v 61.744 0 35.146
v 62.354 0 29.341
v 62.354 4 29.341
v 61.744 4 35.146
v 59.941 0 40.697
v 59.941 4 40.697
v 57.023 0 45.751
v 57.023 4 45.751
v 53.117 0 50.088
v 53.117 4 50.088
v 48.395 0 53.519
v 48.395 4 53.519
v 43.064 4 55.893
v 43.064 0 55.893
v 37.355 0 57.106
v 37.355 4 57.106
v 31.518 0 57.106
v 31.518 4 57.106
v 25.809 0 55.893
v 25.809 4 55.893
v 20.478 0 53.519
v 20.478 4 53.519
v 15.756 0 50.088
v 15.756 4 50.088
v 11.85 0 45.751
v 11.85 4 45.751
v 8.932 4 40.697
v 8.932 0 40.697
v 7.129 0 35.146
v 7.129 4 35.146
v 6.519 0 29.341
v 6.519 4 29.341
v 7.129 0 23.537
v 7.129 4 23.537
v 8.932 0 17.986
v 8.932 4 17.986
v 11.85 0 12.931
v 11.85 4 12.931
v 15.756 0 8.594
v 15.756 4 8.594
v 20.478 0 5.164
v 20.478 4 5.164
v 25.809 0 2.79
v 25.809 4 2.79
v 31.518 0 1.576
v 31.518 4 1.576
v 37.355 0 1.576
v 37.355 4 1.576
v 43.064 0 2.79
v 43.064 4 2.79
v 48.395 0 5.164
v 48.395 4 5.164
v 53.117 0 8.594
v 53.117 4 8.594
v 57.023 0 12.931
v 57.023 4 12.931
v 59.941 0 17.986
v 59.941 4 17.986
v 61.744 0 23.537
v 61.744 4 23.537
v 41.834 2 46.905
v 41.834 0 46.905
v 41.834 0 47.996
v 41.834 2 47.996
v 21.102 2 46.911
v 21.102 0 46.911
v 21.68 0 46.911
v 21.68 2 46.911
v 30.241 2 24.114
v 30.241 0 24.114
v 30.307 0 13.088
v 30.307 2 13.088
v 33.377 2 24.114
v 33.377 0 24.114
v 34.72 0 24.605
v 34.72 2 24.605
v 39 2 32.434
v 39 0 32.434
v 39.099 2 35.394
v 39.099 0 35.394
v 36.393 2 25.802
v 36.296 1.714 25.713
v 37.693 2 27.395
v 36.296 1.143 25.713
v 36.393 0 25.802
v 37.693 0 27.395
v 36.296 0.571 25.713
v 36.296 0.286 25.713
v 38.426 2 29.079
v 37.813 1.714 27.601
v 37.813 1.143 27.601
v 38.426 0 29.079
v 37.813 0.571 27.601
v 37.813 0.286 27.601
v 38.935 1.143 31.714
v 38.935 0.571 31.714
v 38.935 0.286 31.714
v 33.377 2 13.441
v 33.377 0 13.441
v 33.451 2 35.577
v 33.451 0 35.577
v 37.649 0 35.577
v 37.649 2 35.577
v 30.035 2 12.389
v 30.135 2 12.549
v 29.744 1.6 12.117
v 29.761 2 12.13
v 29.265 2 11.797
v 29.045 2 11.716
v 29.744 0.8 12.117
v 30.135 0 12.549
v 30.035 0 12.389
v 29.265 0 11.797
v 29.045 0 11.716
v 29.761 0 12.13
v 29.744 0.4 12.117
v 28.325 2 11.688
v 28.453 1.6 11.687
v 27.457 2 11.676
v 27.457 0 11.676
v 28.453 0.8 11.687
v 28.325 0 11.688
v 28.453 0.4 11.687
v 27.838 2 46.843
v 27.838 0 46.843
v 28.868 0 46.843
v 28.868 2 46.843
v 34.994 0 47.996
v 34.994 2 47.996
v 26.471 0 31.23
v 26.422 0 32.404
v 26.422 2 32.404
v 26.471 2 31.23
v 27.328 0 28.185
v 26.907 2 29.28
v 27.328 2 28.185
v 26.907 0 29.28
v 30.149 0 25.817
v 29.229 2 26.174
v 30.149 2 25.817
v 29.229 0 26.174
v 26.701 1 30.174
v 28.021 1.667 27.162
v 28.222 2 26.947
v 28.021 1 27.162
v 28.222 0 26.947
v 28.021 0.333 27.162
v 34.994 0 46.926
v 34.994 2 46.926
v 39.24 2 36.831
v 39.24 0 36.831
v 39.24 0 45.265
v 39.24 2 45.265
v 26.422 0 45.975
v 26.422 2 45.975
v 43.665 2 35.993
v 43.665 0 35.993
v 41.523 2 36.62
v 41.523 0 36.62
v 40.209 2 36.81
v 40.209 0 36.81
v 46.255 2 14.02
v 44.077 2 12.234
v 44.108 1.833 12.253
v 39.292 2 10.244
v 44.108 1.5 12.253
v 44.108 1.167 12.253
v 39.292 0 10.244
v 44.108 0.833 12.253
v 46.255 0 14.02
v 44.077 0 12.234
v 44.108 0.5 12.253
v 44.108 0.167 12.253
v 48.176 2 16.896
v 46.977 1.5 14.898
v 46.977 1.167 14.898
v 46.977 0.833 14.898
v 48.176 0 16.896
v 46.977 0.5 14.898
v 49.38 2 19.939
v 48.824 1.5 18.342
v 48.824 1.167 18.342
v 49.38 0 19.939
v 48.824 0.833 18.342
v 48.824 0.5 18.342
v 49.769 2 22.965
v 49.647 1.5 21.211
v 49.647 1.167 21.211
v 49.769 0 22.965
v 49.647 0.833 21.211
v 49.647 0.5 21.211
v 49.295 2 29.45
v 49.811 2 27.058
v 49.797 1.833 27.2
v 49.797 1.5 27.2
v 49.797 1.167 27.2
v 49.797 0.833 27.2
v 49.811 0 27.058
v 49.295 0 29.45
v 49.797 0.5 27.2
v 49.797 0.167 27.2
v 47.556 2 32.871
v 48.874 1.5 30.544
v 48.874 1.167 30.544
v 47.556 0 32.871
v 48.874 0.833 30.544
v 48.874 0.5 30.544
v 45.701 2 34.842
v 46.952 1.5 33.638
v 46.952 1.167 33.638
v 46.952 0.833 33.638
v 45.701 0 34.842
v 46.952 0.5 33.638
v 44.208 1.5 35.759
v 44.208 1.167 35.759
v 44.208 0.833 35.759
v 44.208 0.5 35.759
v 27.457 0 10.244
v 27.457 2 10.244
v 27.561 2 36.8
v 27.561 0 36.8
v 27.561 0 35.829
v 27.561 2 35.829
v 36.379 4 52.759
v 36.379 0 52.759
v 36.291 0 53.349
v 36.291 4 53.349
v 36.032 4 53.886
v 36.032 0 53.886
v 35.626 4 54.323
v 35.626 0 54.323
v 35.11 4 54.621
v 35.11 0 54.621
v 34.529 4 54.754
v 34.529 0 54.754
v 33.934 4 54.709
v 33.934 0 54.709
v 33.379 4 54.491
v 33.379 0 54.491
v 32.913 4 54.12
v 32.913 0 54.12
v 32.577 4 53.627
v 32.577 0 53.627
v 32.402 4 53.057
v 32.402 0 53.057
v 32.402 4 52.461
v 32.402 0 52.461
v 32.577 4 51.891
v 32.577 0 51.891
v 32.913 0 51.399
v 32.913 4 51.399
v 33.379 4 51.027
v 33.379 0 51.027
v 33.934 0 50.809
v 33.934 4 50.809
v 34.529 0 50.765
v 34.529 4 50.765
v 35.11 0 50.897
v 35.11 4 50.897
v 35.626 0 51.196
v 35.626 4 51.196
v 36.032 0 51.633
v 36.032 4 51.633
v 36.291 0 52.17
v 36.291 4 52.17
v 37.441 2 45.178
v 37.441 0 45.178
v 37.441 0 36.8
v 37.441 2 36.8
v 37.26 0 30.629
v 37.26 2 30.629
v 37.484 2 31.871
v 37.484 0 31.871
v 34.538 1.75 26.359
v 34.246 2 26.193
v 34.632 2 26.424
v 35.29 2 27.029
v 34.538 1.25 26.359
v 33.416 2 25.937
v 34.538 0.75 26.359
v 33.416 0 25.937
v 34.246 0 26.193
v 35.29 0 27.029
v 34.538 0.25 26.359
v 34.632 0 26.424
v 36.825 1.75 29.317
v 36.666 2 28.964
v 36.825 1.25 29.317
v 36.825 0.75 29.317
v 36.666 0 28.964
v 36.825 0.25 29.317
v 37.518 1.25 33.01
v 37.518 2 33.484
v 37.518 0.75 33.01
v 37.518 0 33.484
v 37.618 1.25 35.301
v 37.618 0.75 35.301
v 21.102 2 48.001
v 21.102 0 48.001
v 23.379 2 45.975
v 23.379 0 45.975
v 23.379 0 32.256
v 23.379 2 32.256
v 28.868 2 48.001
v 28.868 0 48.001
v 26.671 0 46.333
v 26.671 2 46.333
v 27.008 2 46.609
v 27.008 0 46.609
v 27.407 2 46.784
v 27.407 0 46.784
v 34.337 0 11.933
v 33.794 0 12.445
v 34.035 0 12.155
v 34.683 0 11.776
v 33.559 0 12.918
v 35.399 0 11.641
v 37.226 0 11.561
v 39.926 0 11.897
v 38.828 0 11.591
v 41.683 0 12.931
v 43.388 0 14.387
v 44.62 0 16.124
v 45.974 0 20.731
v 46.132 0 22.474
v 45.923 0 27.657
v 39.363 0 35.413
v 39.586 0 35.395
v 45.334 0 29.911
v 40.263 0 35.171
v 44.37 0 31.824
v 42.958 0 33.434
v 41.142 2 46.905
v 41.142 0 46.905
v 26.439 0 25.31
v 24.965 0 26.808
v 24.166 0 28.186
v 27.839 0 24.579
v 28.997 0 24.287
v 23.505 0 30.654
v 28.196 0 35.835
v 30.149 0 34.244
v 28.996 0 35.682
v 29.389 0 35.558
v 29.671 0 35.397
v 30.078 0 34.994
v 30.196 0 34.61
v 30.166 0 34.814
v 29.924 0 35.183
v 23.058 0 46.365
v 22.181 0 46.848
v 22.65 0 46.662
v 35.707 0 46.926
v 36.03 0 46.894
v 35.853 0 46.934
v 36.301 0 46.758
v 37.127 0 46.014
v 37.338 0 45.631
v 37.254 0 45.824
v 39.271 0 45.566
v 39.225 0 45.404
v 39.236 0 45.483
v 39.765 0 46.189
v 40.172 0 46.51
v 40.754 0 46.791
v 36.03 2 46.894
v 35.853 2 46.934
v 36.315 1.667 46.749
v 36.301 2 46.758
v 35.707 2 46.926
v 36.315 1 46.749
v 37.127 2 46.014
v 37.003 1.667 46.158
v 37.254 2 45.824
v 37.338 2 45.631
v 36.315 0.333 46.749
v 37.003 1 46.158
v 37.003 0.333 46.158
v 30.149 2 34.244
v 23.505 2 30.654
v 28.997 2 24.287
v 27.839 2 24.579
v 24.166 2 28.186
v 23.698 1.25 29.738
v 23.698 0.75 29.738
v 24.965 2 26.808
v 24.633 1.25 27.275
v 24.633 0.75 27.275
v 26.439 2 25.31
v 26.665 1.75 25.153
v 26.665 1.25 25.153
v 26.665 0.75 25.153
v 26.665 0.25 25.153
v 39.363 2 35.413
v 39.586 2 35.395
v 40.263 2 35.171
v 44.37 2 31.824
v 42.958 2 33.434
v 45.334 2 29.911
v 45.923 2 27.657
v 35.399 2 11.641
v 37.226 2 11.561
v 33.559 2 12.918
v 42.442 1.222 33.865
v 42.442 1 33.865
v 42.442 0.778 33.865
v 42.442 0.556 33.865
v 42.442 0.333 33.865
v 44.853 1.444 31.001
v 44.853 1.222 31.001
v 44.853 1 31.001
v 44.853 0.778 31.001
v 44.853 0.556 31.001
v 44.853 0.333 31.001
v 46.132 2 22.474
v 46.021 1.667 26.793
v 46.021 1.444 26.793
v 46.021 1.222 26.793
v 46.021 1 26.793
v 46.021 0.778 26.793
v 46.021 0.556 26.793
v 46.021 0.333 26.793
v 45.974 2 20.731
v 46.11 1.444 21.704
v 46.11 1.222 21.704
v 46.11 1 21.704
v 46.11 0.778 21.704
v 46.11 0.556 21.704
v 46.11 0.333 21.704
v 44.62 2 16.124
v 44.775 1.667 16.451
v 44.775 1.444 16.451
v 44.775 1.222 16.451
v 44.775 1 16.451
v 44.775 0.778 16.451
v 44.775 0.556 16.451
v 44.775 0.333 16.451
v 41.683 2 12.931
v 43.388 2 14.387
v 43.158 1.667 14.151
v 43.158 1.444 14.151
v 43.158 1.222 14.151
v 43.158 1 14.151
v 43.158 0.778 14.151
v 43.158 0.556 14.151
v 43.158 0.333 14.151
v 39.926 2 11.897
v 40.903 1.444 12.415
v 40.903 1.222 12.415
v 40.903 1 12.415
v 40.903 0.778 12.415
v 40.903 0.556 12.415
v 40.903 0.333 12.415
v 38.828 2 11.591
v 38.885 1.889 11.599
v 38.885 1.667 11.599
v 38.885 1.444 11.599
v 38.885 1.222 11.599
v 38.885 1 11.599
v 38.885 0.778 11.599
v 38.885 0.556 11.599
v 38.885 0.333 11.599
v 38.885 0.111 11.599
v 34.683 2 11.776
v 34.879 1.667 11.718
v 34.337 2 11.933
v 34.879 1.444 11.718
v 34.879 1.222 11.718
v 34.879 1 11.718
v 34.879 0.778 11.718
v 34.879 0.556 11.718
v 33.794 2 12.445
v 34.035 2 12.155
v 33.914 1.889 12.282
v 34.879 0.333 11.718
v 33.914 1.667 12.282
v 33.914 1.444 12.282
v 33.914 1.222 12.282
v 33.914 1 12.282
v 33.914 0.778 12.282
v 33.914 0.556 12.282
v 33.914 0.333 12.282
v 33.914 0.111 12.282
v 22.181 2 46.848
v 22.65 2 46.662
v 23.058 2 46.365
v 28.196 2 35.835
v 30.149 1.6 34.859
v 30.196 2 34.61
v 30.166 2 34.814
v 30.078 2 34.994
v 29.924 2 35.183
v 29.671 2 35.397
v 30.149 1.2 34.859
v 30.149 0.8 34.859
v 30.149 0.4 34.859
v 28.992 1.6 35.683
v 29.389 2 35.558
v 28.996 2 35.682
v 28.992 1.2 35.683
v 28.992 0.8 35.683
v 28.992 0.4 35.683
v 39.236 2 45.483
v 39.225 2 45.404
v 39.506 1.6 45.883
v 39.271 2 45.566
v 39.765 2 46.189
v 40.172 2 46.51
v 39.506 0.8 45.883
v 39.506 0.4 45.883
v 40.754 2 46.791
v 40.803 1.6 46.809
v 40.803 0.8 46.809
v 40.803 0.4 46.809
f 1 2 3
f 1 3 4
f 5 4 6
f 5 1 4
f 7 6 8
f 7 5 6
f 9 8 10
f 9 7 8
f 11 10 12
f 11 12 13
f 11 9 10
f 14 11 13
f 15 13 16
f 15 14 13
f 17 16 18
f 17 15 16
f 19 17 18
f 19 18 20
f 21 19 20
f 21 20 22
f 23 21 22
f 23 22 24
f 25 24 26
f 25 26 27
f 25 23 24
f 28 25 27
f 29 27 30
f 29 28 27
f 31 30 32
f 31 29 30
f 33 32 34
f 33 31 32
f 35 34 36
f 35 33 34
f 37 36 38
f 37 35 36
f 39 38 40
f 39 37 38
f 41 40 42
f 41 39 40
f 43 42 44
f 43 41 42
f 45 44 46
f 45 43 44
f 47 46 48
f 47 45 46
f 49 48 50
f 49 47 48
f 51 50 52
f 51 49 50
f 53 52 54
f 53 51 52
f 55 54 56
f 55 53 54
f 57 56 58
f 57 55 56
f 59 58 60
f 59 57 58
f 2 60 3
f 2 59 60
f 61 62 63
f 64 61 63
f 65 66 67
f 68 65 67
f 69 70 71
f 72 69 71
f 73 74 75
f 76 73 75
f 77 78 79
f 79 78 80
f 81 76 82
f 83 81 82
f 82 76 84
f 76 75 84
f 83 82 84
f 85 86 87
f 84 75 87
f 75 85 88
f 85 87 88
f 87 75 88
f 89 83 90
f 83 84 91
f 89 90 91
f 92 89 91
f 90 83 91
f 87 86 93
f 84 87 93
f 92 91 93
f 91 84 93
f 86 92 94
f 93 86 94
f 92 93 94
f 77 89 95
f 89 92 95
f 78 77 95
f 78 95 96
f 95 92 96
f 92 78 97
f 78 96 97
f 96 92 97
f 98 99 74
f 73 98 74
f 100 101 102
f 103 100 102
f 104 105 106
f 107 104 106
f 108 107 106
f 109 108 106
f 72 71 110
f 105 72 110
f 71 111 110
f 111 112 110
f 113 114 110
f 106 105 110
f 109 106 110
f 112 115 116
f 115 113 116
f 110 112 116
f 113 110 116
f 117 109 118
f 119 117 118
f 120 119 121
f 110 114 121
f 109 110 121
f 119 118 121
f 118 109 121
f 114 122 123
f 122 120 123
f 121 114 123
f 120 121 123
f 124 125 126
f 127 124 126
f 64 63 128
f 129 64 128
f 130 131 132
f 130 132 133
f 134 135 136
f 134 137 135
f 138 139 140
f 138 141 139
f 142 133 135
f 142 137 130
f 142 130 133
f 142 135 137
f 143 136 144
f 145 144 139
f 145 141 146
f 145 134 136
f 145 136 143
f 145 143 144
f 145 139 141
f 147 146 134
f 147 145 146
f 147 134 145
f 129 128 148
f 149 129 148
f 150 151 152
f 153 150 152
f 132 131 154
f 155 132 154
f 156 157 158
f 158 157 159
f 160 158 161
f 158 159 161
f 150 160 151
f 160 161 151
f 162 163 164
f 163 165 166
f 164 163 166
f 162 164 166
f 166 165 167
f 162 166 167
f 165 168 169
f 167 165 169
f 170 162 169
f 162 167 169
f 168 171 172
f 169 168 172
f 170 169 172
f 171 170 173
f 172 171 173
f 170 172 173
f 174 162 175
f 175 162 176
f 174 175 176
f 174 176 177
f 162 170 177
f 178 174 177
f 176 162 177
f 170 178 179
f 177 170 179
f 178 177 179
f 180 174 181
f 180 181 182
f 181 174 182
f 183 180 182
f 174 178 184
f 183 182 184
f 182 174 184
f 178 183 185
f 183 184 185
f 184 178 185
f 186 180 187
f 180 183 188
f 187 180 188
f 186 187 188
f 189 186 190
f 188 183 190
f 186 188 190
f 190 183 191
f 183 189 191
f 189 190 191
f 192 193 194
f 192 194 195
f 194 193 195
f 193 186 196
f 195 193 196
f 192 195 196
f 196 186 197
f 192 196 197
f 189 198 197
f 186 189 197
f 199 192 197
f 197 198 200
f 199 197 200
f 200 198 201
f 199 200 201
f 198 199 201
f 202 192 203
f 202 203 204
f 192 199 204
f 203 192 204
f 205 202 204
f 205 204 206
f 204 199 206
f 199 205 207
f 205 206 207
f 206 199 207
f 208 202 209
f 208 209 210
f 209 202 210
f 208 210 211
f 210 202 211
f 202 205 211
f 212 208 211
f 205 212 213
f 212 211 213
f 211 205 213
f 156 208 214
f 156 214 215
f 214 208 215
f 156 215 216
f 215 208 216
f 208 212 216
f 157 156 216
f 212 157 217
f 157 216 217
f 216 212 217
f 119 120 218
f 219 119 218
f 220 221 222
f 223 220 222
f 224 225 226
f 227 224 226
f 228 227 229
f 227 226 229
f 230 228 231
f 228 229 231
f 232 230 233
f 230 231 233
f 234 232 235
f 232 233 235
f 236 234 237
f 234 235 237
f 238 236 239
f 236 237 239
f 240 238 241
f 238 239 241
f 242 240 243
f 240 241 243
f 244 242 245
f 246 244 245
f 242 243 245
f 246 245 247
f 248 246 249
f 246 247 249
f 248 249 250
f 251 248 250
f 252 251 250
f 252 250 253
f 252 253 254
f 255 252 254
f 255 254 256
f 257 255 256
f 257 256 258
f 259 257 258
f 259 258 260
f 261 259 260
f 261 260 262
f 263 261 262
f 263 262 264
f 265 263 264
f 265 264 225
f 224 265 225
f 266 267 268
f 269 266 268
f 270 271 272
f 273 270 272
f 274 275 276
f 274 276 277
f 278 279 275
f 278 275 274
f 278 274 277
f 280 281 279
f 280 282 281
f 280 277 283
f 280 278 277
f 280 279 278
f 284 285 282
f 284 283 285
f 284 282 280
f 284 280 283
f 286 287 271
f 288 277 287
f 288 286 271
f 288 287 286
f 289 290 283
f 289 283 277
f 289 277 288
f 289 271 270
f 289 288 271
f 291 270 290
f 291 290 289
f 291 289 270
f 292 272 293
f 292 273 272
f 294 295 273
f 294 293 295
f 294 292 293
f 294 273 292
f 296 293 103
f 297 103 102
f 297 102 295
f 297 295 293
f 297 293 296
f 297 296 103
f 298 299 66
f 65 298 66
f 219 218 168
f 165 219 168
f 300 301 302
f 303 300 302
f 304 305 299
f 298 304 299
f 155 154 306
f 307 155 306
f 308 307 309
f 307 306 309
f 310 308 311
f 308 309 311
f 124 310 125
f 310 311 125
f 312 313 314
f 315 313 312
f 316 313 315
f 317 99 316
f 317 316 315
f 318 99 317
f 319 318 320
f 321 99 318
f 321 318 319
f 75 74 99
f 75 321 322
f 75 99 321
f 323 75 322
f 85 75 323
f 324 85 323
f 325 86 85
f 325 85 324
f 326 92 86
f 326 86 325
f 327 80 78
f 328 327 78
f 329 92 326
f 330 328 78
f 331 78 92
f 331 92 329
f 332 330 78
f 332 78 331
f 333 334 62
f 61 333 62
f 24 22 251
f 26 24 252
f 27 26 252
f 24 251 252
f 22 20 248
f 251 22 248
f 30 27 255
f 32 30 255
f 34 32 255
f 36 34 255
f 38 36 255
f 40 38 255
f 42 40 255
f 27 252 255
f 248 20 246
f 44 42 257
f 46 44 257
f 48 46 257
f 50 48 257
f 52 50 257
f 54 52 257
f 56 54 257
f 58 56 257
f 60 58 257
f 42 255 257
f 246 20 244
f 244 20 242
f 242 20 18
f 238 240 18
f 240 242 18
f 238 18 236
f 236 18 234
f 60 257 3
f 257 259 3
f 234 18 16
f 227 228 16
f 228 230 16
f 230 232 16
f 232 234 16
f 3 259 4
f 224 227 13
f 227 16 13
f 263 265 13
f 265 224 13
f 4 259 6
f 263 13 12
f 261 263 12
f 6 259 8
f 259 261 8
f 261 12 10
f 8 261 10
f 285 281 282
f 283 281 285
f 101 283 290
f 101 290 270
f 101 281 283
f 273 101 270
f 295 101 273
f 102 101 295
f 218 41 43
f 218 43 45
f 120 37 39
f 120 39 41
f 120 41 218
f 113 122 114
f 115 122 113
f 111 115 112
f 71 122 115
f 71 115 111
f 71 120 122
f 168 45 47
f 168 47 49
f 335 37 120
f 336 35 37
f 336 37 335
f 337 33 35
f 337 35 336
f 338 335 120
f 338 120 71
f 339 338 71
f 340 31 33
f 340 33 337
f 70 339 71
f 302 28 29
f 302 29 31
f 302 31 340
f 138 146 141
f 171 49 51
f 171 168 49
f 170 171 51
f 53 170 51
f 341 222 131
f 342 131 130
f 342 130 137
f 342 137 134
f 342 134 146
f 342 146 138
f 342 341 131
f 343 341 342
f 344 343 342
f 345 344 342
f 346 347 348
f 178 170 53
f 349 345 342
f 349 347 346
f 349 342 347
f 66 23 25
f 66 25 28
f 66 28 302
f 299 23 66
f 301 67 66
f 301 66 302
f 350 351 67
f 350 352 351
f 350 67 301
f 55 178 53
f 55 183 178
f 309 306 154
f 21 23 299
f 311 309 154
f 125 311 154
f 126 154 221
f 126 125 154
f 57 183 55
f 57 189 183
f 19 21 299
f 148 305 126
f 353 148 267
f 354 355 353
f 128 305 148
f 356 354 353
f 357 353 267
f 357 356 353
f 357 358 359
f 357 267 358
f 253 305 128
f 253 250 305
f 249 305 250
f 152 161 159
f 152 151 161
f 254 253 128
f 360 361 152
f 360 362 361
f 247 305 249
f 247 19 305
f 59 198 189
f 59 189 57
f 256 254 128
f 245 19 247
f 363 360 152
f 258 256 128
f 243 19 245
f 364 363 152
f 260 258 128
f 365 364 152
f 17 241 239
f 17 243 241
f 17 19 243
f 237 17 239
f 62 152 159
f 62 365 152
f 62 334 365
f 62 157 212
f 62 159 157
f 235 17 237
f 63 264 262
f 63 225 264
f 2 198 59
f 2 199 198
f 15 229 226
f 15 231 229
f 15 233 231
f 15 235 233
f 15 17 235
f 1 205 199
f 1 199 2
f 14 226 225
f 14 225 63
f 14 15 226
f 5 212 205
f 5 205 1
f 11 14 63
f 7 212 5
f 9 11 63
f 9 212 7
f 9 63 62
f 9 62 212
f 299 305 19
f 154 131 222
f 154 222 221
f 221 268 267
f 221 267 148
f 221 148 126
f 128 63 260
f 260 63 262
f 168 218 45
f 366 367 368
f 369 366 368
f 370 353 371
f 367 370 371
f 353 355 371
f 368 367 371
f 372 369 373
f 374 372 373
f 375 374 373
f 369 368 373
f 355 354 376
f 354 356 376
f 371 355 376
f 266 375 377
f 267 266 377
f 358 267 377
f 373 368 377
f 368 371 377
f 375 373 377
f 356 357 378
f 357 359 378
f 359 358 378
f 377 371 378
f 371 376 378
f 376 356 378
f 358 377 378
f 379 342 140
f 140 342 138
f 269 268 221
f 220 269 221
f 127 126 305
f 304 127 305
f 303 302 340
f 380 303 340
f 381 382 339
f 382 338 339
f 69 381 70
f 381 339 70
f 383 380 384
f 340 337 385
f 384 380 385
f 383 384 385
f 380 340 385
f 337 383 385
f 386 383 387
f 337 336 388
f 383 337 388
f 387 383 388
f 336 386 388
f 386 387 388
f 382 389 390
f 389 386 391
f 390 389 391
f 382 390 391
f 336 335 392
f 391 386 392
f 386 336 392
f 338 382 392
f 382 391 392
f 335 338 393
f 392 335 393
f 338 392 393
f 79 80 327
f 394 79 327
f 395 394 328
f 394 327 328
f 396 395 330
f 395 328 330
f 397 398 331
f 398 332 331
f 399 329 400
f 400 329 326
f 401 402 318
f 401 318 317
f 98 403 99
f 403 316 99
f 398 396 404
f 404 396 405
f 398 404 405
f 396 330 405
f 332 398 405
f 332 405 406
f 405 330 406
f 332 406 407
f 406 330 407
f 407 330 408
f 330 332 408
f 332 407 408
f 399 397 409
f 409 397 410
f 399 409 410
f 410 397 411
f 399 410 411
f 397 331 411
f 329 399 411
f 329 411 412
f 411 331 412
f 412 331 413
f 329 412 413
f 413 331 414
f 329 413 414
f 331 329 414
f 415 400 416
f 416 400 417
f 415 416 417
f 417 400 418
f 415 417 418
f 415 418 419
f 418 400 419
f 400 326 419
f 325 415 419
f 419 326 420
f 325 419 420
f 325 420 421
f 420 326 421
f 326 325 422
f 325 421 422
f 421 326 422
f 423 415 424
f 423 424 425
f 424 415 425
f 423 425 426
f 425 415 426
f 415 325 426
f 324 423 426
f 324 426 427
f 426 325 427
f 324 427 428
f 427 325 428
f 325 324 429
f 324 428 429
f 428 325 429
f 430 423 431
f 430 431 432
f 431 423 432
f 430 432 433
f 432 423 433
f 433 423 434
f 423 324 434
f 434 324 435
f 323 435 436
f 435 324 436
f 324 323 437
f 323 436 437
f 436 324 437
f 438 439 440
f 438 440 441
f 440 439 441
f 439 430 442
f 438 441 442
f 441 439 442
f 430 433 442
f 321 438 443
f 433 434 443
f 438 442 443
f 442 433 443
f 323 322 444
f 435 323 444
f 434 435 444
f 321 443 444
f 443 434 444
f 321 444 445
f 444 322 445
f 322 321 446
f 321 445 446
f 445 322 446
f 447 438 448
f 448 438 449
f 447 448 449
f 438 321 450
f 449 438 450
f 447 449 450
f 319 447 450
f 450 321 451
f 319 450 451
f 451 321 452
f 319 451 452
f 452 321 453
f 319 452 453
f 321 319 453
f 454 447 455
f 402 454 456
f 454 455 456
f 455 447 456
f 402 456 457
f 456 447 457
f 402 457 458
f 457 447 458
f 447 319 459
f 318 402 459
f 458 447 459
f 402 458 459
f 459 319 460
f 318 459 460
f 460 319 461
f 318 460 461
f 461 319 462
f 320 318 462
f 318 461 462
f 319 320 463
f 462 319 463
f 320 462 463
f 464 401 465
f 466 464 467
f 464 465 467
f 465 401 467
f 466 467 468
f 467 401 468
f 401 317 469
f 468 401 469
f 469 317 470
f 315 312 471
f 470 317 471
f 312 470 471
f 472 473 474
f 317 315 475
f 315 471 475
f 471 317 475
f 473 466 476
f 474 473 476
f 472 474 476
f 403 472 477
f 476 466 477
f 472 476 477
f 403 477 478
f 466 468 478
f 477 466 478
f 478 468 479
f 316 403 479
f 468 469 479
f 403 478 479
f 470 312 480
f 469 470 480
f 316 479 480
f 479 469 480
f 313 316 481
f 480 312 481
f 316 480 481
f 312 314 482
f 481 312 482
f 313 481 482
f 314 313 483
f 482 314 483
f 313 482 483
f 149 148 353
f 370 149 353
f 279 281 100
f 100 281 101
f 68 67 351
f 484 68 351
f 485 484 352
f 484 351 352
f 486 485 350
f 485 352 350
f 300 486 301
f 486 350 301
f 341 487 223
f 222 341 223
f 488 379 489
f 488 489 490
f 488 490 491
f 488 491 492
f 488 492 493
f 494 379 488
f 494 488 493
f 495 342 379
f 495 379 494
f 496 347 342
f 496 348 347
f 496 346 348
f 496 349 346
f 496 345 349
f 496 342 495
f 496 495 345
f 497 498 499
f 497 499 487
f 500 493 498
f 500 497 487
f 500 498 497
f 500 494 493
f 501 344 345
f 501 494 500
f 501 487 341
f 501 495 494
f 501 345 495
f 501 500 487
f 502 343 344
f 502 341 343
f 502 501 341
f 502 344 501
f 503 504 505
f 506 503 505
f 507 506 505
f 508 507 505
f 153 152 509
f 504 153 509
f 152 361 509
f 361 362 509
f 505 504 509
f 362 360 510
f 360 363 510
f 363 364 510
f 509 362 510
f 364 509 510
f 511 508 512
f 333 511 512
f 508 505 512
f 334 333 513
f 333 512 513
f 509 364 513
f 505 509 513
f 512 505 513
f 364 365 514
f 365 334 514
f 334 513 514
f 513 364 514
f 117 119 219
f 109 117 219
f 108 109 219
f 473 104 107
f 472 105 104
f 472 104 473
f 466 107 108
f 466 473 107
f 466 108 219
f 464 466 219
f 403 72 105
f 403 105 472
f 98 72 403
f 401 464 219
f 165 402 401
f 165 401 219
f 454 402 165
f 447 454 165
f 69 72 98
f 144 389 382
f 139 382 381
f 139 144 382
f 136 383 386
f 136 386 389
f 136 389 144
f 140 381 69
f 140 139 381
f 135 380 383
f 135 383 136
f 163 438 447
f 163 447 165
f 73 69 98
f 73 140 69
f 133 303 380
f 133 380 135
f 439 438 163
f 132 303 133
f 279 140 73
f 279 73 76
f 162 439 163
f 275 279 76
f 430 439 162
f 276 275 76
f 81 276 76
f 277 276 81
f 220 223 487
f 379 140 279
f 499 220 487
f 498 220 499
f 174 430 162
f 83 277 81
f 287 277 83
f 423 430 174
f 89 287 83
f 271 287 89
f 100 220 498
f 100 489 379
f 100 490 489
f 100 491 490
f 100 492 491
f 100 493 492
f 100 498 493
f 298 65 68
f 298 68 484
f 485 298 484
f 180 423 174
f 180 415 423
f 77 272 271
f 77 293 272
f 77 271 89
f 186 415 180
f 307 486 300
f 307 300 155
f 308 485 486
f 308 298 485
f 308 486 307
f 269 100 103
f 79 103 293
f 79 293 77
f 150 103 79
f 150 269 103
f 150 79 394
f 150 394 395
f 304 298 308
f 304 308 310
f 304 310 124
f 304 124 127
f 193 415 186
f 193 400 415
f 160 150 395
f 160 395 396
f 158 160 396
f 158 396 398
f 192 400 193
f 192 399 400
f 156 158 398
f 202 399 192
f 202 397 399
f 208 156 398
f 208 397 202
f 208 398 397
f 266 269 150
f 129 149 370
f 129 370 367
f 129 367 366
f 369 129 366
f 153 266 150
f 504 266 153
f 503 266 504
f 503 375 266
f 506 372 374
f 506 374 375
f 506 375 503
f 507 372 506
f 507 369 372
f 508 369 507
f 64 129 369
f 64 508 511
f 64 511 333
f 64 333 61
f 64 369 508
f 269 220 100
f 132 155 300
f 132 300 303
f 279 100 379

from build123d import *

# Parameters (mm, degrees)
F1_R     = 27.9179643297
F2_DEPTH = 4
F3_DEPTH = 2
F4_R     = 2
F5_DEPTH = 25


with BuildPart() as f2:
    # F1 (on Front) → F2 (new body)
    with BuildSketch(Plane.XZ):
        with Locations((34.4365164638, 29.3412599713)):
            Circle(F1_R)
    extrude(amount=-F2_DEPTH)

    # F0 (on Front) → F3 (cut)
    with BuildSketch(Plane.XZ):
        with BuildLine():
            Line((28.8679711521, 48.000831157), (21.2418399751, 48.000831157))
            Line((21.2418399751, 48.000831157), (21.1016796529, 48.000831157))
            Line((21.1016796529, 48.000831157), (21.1016796529, 46.9109527767))
            Line((21.1016796529, 46.9109527767), (21.6799061745, 46.9109527767))
            ThreePointArc((21.6799061745, 46.9109527767), (22.6499247341, 46.6616237032), (23.3794841915, 45.9754429758))
            Line((23.3794841915, 45.9754429758), (23.3794841915, 32.2561040521))
            add(Edge.make_bspline(
                [(23.3794841915, 32.2561040521), (23.3661779434, 32.0413049632), (23.3320361161, 31.4901628764), (23.6830336391, 29.7012833817), (24.04912574, 28.4066435414), (24.5758922104, 27.2393122591), (25.6286713635, 25.9943517485), (26.6272868609, 25.0908477478), (28.1867559009, 24.3640116011), (29.5303038983, 24.2007807914), (30.2409324795, 24.1144448519)],
                knots=[0, 0, 0, 0, 0.0888691777, 0.2280249154, 0.350012674, 0.4658880454, 0.5969114819, 0.716998109, 0.8503148137, 1, 1, 1, 1], degree=3))
            Line((30.2409324795, 24.1144448519), (30.3066652268, 13.0882738158))
            add(Edge.make_bspline(
                [(30.3066652268, 13.0882738158), (30.2519389049, 12.8681959728), (30.1482070308, 12.4510459374), (29.7504803796, 12.113676258), (29.1331387589, 11.6544957812), (28.4405708125, 11.6986950554), (27.8053497246, 11.6841554859), (27.4567119777, 11.6761755198)],
                knots=[0, 0, 0, 0, 0.1909217212, 0.3618856023, 0.5653560725, 0.7614479707, 1, 1, 1, 1], degree=3))
            Line((27.4567119777, 11.6761755198), (27.4567119777, 10.2444272488))
            Line((27.4567119777, 10.2444272488), (39.2920188606, 10.2444272488))
            add(Edge.make_bspline(
                [(39.2920188606, 10.2444272488), (39.774682126, 10.3988373959), (40.9569851668, 10.7770712485), (44.3231835186, 12.1005887696), (47.1546084039, 14.7204409379), (48.8954359497, 18.2960298868), (49.8018932136, 21.1532808912), (49.7495385908, 24.2814068636), (49.9847142006, 27.2262407584), (49.0185777967, 30.6280669447), (47.0902622954, 33.7806859912), (44.4294388961, 35.9695773633), (40.7821955148, 36.8440674423), (39.6719954936, 36.8345831371), (39.2397977412, 36.8308909237)],
                knots=[0, 0, 0, 0, 0.0615832149, 0.1508505567, 0.2445844204, 0.3383755074, 0.4203584246, 0.5031957528, 0.5846146114, 0.6729862854, 0.7635389413, 0.8519093339, 0.9423487193, 1, 1, 1, 1], degree=3))
            Line((39.2397977412, 36.8308909237), (39.2397977412, 45.2651903033))
            add(Edge.make_bspline(
                [(39.2397977412, 45.2651903033), (39.2267765482, 45.3390324549), (39.1951002718, 45.5186661031), (39.5358008729, 45.9054656845), (39.9151458428, 46.4211622217), (40.7868707349, 46.8253428314), (41.0441350327, 46.882763452), (41.1419421434, 46.9045937061)],
                knots=[0, 0, 0, 0, 0.1349216013, 0.3282198439, 0.56053159, 0.8329222679, 1, 1, 1, 1], degree=3))
            Line((41.1419421434, 46.9045937061), (41.8343655765, 46.9045937061))
            Line((41.8343655765, 46.9045937061), (41.8343655765, 47.9957386851))
            Line((41.8343655765, 47.9957386851), (34.9940881133, 47.9957386851))
            Line((34.9940881133, 47.9957386851), (34.9940881133, 46.9255782664))
            Line((34.9940881133, 46.9255782664), (35.7074923813, 46.9255782664))
            add(Edge.make_bspline(
                [(35.7074923813, 46.9255782664), (35.7725247196, 46.9332369871), (35.9309551857, 46.9518950075), (36.3382974268, 46.7609951149), (36.6952182588, 46.4487825628), (37.0128103957, 46.167012536), (37.339789857, 45.7546042988), (37.4062912416, 45.3744266144), (37.4407209456, 45.1775975525)],
                knots=[0, 0, 0, 0, 0.1164756704, 0.2837556706, 0.4602097948, 0.6255055551, 0.8061133168, 1, 1, 1, 1], degree=3))
            Line((37.4407209456, 45.1775975525), (37.4407209456, 36.8000268936))
            Line((37.4407209456, 36.8000268936), (27.5614373386, 36.8000268936))
            Line((27.5614373386, 36.8000268936), (27.5614373386, 35.8287543058))
            add(Edge.make_bspline(
                [(30.1494058222, 34.2443399131), (30.1896564321, 34.4509421046), (30.2766012041, 34.8972205701), (29.5772517128, 35.520044137), (29.0139060262, 35.687739493), (28.0963009598, 35.8817409513), (27.7230364986, 35.8447632417), (27.5614373386, 35.8287543058)],
                knots=[0, 0, 0, 0, 0.188016088, 0.4061308867, 0.5960955039, 0.8251357038, 1, 1, 1, 1], degree=3))
            Line((30.1494058222, 34.2443399131), (30.1494058222, 25.8165877312))
            add(Edge.make_bspline(
                [(26.4220070094, 32.4044786394), (26.4054135192, 32.144103332), (26.3671691029, 31.5439943998), (26.7250529812, 30.137856966), (26.997643123, 28.6904244326), (27.9178734275, 27.1039006684), (29.2097838012, 26.097703964), (29.864963328, 25.9016872719), (30.1494058222, 25.8165877312)],
                knots=[0, 0, 0, 0, 0.132106129, 0.304476138, 0.4817482165, 0.6765618752, 0.8595811634, 1, 1, 1, 1], degree=3))
            Line((26.4220070094, 32.4044786394), (26.4220070094, 45.9754429758))
            ThreePointArc((26.4220070094, 45.9754429758), (27.0076995947, 46.6092174693), (27.8382524848, 46.8434989452))
            Line((27.8382524848, 46.8434989452), (28.8679711521, 46.8434989452))
            Line((28.8679711521, 46.8434989452), (28.8679711521, 48.000831157))
        make_face()
        with BuildLine():
            add(Edge.make_bspline(
                [(39.09862414, 35.3939756751), (39.2489142969, 35.4107928497), (39.639265501, 35.4544723857), (40.8527321152, 34.9290898948), (42.4915814336, 33.920624453), (43.934425555, 32.5212947097), (44.9117436655, 31.0245386214), (45.6828391517, 29.0810146814), (46.1131529724, 26.7864365553), (46.0320421568, 24.1289257106), (46.2303553926, 21.67390112), (45.6862086311, 19.5074958509), (44.9519356526, 16.3357981895), (43.2911073701, 14.0788427037), (40.9393886003, 12.35222079), (38.9754938067, 11.387406624), (36.3568333041, 11.6507746265), (34.9065236601, 11.5992055554), (33.7840628182, 12.1906613468), (33.5150350229, 13.0170747001), (33.3767347038, 13.4411733598)],
                knots=[0, 0, 0, 0, 0.0278621403, 0.072346602, 0.1281760017, 0.184186641, 0.2368545361, 0.2935923676, 0.3541545772, 0.4189988933, 0.4805108226, 0.5397349175, 0.6105127582, 0.676938702, 0.7437706408, 0.8022168053, 0.8654938882, 0.9133444026, 0.9552158969, 1, 1, 1, 1], degree=3))
            Line((33.3767347038, 13.4411733598), (33.3767347038, 24.1144448519))
            add(Edge.make_bspline(
                [(33.3767347038, 24.1144448519), (33.6901716031, 24.1916175876), (34.4632174132, 24.38195274), (36.4247235951, 25.6354977326), (37.910338629, 27.5423966525), (38.5769336104, 29.3999250787), (38.987720793, 31.6925237691), (39.0753395699, 33.8937436106), (39.0914103783, 34.9291907767), (39.09862414, 35.3939756751)],
                knots=[0, 0, 0, 0, 0.1061132557, 0.2617126696, 0.4217322602, 0.5651750938, 0.7223566935, 0.8753732491, 1, 1, 1, 1], degree=3))
        make_face(mode=Mode.SUBTRACT)
        with BuildLine():
            Line((33.4505289793, 35.5766043067), (37.4476835132, 35.5766043067))
            Line((37.4476835132, 35.5766043067), (37.6491434872, 35.5766043067))
            add(Edge.make_bspline(
                [(33.4158986807, 25.9369481355), (33.7826276111, 26.0178916222), (34.6424104405, 26.2076607246), (36.1064740511, 27.9584988419), (36.8783895278, 29.2442653684), (37.5289813574, 31.4438618672), (37.514839846, 32.9876868997), (37.5193508062, 34.1826977599), (37.6115348752, 35.2757328046), (37.6396337795, 35.5005259857), (37.6491434872, 35.5766043067)],
                knots=[0, 0, 0, 0, 0.118540095, 0.2779130028, 0.4147721278, 0.5762668706, 0.7112726522, 0.8315398927, 0.9429868732, 1, 1, 1, 1], degree=3))
            Line((33.4158986807, 25.9369481355), (33.4505289793, 35.5766043067))
        make_face(mode=Mode.SUBTRACT)
    extrude(amount=-F3_DEPTH, mode=Mode.SUBTRACT)

    # F4 (on face) → F5 (cut)
    with BuildSketch(Plane.XZ):
        with Locations((34.3794152141, 52.7591659057)):
            Circle(F4_R)
    extrude(amount=-F5_DEPTH, mode=Mode.SUBTRACT)


solid = f2.part
